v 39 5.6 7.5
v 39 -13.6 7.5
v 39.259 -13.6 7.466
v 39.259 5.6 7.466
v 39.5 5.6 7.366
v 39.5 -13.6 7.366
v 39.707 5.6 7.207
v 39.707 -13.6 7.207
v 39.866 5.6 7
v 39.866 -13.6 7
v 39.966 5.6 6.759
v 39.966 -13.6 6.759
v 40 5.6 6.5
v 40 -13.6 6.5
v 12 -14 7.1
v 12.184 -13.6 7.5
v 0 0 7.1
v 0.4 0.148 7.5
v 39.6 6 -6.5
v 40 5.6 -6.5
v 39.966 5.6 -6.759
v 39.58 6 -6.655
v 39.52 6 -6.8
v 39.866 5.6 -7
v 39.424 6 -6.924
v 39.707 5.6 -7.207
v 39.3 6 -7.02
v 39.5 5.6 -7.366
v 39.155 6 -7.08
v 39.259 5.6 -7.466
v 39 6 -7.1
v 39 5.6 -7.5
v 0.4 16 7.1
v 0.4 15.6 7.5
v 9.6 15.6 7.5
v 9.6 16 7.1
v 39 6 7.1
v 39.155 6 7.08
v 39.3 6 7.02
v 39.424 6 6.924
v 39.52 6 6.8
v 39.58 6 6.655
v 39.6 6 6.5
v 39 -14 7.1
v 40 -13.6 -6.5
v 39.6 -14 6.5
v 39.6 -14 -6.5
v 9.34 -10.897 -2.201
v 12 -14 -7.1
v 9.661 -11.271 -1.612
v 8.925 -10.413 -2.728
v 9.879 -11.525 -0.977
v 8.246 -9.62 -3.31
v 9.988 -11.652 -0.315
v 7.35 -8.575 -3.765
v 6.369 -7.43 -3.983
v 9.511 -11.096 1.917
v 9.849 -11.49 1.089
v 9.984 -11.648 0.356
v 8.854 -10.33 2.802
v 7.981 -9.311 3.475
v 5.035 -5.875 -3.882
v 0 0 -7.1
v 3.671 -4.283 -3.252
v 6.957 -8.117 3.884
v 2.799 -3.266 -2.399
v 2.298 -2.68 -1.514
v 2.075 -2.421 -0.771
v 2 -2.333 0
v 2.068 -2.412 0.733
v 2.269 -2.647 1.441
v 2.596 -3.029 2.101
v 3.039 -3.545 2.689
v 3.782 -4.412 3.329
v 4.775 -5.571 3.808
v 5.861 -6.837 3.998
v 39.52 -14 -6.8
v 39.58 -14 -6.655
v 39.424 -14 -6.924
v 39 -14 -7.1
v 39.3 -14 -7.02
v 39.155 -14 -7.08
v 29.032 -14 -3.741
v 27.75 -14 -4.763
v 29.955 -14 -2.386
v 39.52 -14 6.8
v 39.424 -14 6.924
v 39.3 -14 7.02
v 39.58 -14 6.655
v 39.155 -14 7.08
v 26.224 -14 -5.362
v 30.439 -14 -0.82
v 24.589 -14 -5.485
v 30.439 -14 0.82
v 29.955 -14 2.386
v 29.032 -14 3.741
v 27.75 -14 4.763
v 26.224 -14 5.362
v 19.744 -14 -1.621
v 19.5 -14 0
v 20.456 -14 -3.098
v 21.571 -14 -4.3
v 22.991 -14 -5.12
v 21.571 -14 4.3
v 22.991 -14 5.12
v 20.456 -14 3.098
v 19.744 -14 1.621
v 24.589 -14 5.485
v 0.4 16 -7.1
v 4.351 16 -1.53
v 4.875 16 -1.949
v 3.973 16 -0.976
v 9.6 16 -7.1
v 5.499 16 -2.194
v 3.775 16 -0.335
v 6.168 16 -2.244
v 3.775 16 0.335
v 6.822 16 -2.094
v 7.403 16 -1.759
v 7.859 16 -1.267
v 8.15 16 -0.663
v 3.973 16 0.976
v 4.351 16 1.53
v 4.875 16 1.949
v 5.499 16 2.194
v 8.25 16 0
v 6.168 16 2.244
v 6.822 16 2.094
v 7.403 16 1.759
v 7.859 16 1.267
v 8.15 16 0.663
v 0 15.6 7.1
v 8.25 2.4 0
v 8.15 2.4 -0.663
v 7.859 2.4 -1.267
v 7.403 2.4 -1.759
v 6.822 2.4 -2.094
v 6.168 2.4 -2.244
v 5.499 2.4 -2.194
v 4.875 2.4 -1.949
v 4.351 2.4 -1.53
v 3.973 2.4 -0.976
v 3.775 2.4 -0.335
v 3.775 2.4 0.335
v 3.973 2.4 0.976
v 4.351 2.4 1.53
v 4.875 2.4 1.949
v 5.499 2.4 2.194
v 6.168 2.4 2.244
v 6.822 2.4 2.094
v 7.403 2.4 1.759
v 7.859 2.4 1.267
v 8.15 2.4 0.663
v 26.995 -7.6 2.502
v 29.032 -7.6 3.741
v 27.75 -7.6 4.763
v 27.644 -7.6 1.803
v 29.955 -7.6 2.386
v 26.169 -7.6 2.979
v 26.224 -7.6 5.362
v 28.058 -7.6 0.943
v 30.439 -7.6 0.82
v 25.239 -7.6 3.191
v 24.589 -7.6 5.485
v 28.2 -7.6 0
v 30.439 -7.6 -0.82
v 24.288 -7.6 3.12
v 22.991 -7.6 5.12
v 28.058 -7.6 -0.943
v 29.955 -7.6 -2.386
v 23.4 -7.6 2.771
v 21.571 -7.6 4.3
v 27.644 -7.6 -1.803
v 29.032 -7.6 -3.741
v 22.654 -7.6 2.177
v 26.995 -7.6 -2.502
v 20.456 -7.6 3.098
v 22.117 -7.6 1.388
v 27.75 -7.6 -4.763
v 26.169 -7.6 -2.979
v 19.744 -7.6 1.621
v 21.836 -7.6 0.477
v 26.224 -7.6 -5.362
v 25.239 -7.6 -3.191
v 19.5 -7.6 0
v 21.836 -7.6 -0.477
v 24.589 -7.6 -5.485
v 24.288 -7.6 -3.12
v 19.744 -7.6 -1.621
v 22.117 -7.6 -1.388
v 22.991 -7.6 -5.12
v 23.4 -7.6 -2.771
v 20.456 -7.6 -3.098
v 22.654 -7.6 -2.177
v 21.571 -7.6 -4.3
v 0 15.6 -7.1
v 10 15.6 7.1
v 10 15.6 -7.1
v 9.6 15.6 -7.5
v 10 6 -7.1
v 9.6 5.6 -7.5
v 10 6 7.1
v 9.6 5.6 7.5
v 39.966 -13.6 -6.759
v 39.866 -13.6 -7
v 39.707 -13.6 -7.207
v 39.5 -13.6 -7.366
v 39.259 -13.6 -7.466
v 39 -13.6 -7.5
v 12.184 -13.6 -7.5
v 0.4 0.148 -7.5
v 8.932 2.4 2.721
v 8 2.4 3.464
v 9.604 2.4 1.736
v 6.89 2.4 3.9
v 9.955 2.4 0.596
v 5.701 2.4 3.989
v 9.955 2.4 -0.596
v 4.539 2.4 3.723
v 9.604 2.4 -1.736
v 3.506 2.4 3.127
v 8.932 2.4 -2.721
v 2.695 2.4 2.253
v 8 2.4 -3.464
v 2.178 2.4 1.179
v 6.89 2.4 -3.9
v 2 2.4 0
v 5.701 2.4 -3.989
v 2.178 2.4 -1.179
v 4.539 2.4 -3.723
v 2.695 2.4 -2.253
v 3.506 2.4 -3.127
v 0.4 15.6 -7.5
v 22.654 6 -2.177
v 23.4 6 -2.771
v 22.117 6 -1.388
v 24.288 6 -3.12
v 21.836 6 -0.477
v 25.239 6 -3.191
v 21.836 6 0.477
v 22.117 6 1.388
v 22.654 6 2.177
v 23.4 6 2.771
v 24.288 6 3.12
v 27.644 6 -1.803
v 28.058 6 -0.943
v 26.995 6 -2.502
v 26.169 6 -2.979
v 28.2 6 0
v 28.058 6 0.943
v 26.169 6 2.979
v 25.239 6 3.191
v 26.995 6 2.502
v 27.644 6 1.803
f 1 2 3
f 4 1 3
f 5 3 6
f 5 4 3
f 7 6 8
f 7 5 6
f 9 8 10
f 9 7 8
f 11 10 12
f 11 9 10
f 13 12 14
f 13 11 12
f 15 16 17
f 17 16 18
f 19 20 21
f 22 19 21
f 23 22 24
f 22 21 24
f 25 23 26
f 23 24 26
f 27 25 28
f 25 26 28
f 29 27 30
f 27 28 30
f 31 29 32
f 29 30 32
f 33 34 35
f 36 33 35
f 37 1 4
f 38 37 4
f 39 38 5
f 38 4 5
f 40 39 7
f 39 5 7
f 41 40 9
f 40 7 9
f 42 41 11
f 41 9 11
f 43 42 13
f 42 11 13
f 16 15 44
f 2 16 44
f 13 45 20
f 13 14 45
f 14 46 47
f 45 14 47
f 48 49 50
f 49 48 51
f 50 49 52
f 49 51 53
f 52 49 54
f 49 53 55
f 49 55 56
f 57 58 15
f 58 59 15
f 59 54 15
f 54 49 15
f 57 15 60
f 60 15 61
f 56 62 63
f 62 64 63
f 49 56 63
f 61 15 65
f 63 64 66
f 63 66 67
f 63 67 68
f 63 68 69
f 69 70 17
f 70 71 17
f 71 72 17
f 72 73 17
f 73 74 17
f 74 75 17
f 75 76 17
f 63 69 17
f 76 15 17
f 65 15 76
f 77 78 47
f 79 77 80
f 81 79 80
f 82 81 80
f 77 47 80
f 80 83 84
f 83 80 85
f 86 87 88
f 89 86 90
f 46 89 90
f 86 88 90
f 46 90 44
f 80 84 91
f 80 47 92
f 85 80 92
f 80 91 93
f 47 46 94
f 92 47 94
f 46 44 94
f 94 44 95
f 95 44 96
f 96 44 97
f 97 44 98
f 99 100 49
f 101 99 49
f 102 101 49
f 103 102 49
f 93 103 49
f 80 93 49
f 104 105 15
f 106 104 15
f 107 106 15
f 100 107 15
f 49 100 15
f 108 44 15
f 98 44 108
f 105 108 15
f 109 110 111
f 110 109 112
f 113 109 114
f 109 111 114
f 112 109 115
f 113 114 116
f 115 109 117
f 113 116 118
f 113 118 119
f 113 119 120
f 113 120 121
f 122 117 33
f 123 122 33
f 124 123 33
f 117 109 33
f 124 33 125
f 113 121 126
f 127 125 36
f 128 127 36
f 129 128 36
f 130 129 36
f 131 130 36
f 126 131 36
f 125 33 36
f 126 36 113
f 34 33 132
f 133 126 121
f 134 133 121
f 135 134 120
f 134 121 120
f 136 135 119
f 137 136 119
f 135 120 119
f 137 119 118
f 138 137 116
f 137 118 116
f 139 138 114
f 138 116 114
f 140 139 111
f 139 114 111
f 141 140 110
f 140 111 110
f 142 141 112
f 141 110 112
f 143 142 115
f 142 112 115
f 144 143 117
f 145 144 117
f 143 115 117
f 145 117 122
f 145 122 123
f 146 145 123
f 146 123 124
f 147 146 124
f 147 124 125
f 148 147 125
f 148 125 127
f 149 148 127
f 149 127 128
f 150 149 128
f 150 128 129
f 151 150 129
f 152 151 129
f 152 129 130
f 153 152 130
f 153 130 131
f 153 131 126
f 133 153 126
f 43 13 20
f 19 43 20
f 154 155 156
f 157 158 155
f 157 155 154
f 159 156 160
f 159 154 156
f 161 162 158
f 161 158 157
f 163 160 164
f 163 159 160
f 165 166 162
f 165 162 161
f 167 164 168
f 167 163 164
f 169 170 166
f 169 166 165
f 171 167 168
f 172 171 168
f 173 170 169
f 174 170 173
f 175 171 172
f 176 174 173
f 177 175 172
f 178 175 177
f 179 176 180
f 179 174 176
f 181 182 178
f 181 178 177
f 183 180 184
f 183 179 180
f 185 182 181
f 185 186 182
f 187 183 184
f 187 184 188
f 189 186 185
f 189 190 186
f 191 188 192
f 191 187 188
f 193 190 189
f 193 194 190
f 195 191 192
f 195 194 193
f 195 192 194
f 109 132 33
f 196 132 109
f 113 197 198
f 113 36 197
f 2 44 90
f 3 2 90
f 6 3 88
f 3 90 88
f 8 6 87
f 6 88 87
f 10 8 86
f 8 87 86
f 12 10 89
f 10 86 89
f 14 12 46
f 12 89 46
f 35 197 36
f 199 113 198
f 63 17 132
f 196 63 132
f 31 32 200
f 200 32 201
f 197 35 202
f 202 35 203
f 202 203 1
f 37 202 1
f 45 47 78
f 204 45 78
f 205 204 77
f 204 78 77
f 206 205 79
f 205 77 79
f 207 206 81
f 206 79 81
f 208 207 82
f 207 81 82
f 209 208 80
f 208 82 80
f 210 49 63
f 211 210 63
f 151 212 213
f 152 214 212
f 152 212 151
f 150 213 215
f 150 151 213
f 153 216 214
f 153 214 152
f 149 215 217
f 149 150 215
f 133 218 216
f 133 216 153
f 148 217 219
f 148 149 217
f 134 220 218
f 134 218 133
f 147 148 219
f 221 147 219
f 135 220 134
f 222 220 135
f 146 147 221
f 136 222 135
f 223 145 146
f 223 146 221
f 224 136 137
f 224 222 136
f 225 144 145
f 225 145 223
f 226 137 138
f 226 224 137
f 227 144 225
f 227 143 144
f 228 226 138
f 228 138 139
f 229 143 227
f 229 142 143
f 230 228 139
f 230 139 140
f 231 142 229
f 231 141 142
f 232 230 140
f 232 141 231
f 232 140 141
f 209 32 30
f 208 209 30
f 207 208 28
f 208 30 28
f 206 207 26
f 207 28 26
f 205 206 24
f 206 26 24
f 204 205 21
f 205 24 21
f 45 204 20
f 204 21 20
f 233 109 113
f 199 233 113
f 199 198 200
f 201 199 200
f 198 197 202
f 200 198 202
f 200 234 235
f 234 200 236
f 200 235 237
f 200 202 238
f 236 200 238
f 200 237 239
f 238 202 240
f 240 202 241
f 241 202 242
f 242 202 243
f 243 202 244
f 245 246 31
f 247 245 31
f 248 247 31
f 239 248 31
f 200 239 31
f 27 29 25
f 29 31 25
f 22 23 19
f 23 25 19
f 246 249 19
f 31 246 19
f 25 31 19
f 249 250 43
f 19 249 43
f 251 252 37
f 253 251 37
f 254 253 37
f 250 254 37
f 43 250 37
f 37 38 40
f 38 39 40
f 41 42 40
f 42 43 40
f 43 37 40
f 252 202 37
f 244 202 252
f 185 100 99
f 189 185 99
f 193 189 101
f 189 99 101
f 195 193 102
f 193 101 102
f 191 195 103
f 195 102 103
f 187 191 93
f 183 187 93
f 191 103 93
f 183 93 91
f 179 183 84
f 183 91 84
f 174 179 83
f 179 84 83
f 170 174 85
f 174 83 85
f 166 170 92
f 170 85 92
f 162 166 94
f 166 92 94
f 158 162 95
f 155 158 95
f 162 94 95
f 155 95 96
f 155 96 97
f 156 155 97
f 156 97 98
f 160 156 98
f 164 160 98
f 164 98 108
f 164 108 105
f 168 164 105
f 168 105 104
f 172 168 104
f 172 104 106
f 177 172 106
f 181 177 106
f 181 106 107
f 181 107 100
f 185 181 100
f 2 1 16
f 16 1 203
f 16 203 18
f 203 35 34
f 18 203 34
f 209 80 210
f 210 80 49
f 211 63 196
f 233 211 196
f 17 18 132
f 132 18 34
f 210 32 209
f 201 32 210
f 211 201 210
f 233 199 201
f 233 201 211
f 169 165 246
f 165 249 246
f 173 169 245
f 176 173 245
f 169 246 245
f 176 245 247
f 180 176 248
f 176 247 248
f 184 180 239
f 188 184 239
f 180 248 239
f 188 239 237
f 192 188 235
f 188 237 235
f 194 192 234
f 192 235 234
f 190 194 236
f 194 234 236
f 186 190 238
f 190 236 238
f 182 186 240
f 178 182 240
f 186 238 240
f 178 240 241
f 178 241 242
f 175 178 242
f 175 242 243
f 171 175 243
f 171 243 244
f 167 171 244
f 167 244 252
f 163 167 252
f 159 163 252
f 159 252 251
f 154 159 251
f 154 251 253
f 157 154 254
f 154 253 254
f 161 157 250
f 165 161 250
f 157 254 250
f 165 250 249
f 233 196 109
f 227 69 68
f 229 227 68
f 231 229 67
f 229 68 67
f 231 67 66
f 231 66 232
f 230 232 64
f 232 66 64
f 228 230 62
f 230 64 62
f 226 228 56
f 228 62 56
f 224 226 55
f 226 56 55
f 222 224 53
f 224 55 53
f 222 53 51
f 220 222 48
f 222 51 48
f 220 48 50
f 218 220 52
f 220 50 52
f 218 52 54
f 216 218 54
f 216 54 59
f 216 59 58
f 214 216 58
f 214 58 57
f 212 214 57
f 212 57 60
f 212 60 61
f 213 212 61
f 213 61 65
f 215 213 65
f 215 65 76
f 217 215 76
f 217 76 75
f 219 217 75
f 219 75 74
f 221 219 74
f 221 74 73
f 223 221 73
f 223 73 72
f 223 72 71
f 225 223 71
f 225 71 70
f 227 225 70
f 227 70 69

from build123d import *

# Parameters (mm, degrees)
BOSS_EXTRUDE1_DEPTH                                 = 7.5
CBORE_FOR_M6_HEX_SOCKET_HEAD_CAP_SCREW1_D           = 6.4
CBORE_FOR_M6_HEX_SOCKET_HEAD_CAP_SCREW1_CBORE_D     = 11
CBORE_FOR_M6_HEX_SOCKET_HEAD_CAP_SCREW1_CBORE_DEPTH = 6.4
TAP_DRILL_FOR_M4_TAP1_D                             = 3.3
CBORE_FOR_M4_HEX_SOCKET_HEAD_CAP_SCREW1_D           = 4.5
CBORE_FOR_M4_HEX_SOCKET_HEAD_CAP_SCREW1_DEPTH       = 30
CBORE_FOR_M4_HEX_SOCKET_HEAD_CAP_SCREW1_CBORE_D     = 8
CBORE_FOR_M4_HEX_SOCKET_HEAD_CAP_SCREW1_CBORE_DEPTH = 16.4
FILLET1_R                                           = 1
CHAMFER1_SIZE                                       = 0.4


with BuildPart() as part:
    # Sketch1 → Boss-Extrude1 (new, symmetric)
    with BuildSketch(Plane.XY):
        Polygon((0, 0), (0, 16), (10, 16), (10, 6), (40, 6), (40, 0), (40, -14), (12, -14), align=None)
    extrude(amount=BOSS_EXTRUDE1_DEPTH, both=True)

    # CBORE for M6 Hex Socket Head Cap Screw1 (through all)
    with Locations(Plane(origin=(0, -14, 0), x_dir=(-1, 0, 0), z_dir=(0, -1, 0))):
        with Locations((-25, 0)):
            CounterBoreHole(CBORE_FOR_M6_HEX_SOCKET_HEAD_CAP_SCREW1_D / 2, CBORE_FOR_M6_HEX_SOCKET_HEAD_CAP_SCREW1_CBORE_D / 2, CBORE_FOR_M6_HEX_SOCKET_HEAD_CAP_SCREW1_CBORE_DEPTH)

    # Tap Drill for M4 Tap1 (through all)
    with Locations(Plane(origin=(16, 16, 0), x_dir=(0, 0, 1), z_dir=(0, 1, 0))):
        with Locations((0, -10)):
            Hole(TAP_DRILL_FOR_M4_TAP1_D / 2)

    # CBORE for M4 Hex Socket Head Cap Screw1
    with Locations(Plane(origin=(0, -14, 0), x_dir=(-1, 0, 0), z_dir=(0, -1, 0))):
        with Locations((-6, 0)):
            CounterBoreHole(CBORE_FOR_M4_HEX_SOCKET_HEAD_CAP_SCREW1_D / 2, CBORE_FOR_M4_HEX_SOCKET_HEAD_CAP_SCREW1_CBORE_D / 2, CBORE_FOR_M4_HEX_SOCKET_HEAD_CAP_SCREW1_CBORE_DEPTH, depth=CBORE_FOR_M4_HEX_SOCKET_HEAD_CAP_SCREW1_DEPTH)

    # Fillet1
    fillet1_edges = [part.edges().sort_by_distance(p)[0] for p in [
        (40, -4, -7.5),
        (40, -4, 7.5),
    ]]
    fillet(fillet1_edges, radius=FILLET1_R)

    # Chamfer1
    chamfer1_edges = [part.edges().sort_by_distance(p)[0] for p in [
        (25.5, -14, -7.5),
        (6, -7, -7.5),
        (0, 16, 0),
        (10, 16, 0),
        (10, 11, 7.5),
        (5, 16, 7.5),
        (0, 8, 7.5),
        (6, -7, 7.5),
        (40, 6, 0),
        (40, -14, 0),
        (24.5, 6, -7.5),
        (24.5, 6, 7.5),
        (39.707106781, 6, 7.207106781),
        (39.707106781, 6, -7.207106781),
        (39.707106781, -14, 7.207106781),
        (39.707106781, -14, -7.207106781),
        (0, 8, -7.5),
        (25.5, -14, 7.5),
        (5, 16, -7.5),
        (10, 11, -7.5),
    ]]
    chamfer(chamfer1_edges, length=CHAMFER1_SIZE)


solid = part.part
